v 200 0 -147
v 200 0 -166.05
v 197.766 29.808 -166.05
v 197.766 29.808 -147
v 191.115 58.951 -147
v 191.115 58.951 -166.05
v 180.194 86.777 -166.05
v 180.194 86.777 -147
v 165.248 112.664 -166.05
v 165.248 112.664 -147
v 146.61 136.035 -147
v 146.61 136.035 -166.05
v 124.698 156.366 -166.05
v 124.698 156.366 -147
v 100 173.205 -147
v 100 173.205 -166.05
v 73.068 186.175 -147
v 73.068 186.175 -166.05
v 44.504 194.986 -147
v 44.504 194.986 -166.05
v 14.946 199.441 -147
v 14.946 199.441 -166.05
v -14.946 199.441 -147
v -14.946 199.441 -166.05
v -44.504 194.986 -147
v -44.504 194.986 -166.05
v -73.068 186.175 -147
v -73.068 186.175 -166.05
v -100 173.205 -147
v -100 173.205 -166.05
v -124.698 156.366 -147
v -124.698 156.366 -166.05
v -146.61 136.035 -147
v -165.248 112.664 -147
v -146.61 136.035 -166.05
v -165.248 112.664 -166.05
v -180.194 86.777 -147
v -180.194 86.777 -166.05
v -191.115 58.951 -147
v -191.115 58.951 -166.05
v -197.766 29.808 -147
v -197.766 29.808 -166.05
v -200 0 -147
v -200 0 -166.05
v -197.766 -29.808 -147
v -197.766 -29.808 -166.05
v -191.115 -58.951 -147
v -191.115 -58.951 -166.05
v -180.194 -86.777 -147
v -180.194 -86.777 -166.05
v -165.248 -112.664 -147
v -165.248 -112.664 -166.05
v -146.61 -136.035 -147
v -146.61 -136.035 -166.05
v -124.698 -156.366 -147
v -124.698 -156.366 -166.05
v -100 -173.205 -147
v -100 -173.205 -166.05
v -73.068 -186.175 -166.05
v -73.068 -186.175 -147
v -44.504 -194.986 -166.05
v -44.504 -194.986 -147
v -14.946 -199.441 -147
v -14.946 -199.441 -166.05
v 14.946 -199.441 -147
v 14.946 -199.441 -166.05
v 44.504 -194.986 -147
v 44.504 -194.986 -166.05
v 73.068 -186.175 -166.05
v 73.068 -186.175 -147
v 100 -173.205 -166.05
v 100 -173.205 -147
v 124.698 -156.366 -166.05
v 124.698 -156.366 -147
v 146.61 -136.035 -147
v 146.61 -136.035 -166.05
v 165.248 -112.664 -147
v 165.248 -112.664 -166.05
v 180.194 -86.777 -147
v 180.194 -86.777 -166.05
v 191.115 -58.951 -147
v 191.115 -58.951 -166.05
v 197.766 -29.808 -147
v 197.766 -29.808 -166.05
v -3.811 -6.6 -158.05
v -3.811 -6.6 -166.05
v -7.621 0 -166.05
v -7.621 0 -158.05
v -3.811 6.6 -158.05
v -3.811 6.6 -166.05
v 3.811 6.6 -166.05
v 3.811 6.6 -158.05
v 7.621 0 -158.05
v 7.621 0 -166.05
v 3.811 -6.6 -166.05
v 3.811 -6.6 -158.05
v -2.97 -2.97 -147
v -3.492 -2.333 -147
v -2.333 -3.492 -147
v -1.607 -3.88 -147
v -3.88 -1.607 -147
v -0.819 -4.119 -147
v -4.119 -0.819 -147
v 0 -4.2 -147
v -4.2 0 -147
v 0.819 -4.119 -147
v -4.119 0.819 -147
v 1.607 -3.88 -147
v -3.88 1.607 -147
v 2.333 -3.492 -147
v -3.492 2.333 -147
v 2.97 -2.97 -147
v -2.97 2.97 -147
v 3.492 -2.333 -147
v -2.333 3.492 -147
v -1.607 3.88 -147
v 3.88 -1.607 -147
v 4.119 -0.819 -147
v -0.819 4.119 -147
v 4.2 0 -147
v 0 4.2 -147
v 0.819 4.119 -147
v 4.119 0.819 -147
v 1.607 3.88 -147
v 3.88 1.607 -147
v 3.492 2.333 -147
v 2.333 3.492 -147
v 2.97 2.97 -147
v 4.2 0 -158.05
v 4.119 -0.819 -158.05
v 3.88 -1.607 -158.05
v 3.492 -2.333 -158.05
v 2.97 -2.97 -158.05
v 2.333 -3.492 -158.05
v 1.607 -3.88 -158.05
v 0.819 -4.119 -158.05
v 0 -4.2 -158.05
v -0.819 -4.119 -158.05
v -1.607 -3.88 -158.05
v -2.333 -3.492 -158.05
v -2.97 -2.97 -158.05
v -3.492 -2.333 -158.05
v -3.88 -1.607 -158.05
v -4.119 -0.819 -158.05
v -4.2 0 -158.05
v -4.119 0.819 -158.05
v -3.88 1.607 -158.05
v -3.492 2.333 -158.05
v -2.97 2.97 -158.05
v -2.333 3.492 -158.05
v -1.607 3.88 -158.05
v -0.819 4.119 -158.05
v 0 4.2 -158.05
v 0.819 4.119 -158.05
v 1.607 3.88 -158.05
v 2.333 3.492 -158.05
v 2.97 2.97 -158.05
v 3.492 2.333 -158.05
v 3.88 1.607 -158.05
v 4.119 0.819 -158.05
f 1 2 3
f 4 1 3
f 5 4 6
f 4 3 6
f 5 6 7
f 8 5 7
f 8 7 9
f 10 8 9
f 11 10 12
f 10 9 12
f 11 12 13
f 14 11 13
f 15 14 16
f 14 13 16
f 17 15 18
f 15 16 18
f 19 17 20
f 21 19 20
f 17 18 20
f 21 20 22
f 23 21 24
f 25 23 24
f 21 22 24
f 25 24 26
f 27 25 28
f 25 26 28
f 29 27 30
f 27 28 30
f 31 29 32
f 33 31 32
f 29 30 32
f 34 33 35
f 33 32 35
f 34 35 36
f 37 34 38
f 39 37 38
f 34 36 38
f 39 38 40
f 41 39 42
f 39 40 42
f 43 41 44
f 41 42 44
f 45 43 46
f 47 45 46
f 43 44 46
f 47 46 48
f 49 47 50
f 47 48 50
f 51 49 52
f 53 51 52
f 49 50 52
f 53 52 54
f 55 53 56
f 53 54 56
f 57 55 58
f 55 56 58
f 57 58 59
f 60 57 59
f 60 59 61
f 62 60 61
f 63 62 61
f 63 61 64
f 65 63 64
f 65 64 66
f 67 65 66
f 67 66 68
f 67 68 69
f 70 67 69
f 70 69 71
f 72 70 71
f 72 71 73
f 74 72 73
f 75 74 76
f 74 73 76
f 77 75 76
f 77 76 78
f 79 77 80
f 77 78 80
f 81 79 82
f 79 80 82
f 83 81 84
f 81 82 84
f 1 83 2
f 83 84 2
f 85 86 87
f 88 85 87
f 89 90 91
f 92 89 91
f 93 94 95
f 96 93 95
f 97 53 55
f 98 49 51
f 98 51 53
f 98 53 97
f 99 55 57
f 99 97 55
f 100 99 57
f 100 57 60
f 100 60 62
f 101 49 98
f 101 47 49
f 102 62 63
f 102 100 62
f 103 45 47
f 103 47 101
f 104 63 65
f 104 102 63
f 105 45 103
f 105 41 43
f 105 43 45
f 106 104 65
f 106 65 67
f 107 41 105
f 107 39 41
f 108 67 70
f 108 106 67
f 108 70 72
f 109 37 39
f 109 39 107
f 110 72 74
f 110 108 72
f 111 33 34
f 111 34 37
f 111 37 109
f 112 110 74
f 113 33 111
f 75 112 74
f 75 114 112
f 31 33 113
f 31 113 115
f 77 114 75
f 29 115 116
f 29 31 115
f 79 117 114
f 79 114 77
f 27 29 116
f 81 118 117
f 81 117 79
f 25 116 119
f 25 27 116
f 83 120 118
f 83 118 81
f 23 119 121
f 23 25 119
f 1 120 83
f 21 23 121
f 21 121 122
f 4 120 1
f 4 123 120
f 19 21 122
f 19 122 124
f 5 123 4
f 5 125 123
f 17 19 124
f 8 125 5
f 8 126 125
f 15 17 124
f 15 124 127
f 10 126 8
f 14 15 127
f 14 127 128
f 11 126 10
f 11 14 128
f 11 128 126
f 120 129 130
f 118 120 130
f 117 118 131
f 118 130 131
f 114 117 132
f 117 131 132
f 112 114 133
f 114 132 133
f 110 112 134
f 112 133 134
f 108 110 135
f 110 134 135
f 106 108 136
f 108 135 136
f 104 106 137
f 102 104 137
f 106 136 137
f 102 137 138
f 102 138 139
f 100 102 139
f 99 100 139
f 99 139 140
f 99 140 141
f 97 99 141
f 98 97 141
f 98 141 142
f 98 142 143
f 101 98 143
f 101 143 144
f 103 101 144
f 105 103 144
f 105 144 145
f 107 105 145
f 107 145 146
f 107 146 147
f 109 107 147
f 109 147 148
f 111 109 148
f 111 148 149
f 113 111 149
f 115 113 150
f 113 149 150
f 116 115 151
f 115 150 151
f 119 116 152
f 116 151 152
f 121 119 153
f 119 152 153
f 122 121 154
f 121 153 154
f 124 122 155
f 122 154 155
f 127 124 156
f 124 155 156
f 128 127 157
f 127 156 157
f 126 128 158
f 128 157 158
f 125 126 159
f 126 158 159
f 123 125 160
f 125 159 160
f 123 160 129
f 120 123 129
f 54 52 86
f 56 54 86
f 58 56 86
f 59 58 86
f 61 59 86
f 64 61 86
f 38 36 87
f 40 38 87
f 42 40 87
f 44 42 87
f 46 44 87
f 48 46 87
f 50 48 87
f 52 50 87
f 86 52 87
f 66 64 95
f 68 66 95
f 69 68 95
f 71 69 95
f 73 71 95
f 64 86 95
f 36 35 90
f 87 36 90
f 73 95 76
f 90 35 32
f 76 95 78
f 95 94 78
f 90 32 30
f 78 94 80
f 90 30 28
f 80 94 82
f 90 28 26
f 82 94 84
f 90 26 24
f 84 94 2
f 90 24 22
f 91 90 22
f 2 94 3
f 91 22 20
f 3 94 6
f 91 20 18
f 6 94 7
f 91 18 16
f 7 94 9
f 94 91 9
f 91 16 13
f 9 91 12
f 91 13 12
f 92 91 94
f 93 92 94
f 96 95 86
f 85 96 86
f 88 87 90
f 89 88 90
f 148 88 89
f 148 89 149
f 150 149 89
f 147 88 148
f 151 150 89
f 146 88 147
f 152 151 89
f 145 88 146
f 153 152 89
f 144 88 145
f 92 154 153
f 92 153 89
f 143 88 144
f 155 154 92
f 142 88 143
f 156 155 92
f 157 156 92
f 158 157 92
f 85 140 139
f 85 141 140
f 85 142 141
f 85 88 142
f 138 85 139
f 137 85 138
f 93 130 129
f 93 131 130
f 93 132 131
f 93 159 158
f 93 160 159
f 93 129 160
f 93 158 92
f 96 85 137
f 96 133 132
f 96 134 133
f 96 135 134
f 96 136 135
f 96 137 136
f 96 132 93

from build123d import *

# Parameters (mm, degrees)
CYLINDER006_R     = 200
CYLINDER006_DEPTH = 19.05
POCKET045_DEPTH   = 8
SKETCH106_R       = 4.2
HOLE037_DEPTH     = 11.051


with BuildPart() as part:
    # Cylinder006 → Cylinder006 (join)
    with BuildSketch(Plane.XY.offset(-19.05)):
        Circle(CYLINDER006_R)
    extrude(amount=CYLINDER006_DEPTH)

    # Sketch105 (on Face3 of Cylinder006) → Pocket045 (cut)
    with BuildSketch(Plane(origin=(0, 0, -19.05), x_dir=(1, 0, 0), z_dir=(0, 0, -1))):
        Polygon((3.810512, -6.6), (7.621024, 0), (3.810512, 6.6), (-3.810512, 6.6), (-7.621024, 0), (-3.810512, -6.6), align=None)
    extrude(amount=-POCKET045_DEPTH, mode=Mode.SUBTRACT)

    # Sketch106 (on Face10 of Pocket045) → Hole037 (cut, through all)
    with BuildSketch(Plane(origin=(0, 0, -11.05), x_dir=(1, 0, 0), z_dir=(0, 0, -1))):
        Circle(SKETCH106_R)
    extrude(amount=-HOLE037_DEPTH, mode=Mode.SUBTRACT)


with BuildPart() as part_1:
    # Body022020 placement: moved
    add(part.part.moved(Location((0, 0, -147))))


solid = part_1.part
